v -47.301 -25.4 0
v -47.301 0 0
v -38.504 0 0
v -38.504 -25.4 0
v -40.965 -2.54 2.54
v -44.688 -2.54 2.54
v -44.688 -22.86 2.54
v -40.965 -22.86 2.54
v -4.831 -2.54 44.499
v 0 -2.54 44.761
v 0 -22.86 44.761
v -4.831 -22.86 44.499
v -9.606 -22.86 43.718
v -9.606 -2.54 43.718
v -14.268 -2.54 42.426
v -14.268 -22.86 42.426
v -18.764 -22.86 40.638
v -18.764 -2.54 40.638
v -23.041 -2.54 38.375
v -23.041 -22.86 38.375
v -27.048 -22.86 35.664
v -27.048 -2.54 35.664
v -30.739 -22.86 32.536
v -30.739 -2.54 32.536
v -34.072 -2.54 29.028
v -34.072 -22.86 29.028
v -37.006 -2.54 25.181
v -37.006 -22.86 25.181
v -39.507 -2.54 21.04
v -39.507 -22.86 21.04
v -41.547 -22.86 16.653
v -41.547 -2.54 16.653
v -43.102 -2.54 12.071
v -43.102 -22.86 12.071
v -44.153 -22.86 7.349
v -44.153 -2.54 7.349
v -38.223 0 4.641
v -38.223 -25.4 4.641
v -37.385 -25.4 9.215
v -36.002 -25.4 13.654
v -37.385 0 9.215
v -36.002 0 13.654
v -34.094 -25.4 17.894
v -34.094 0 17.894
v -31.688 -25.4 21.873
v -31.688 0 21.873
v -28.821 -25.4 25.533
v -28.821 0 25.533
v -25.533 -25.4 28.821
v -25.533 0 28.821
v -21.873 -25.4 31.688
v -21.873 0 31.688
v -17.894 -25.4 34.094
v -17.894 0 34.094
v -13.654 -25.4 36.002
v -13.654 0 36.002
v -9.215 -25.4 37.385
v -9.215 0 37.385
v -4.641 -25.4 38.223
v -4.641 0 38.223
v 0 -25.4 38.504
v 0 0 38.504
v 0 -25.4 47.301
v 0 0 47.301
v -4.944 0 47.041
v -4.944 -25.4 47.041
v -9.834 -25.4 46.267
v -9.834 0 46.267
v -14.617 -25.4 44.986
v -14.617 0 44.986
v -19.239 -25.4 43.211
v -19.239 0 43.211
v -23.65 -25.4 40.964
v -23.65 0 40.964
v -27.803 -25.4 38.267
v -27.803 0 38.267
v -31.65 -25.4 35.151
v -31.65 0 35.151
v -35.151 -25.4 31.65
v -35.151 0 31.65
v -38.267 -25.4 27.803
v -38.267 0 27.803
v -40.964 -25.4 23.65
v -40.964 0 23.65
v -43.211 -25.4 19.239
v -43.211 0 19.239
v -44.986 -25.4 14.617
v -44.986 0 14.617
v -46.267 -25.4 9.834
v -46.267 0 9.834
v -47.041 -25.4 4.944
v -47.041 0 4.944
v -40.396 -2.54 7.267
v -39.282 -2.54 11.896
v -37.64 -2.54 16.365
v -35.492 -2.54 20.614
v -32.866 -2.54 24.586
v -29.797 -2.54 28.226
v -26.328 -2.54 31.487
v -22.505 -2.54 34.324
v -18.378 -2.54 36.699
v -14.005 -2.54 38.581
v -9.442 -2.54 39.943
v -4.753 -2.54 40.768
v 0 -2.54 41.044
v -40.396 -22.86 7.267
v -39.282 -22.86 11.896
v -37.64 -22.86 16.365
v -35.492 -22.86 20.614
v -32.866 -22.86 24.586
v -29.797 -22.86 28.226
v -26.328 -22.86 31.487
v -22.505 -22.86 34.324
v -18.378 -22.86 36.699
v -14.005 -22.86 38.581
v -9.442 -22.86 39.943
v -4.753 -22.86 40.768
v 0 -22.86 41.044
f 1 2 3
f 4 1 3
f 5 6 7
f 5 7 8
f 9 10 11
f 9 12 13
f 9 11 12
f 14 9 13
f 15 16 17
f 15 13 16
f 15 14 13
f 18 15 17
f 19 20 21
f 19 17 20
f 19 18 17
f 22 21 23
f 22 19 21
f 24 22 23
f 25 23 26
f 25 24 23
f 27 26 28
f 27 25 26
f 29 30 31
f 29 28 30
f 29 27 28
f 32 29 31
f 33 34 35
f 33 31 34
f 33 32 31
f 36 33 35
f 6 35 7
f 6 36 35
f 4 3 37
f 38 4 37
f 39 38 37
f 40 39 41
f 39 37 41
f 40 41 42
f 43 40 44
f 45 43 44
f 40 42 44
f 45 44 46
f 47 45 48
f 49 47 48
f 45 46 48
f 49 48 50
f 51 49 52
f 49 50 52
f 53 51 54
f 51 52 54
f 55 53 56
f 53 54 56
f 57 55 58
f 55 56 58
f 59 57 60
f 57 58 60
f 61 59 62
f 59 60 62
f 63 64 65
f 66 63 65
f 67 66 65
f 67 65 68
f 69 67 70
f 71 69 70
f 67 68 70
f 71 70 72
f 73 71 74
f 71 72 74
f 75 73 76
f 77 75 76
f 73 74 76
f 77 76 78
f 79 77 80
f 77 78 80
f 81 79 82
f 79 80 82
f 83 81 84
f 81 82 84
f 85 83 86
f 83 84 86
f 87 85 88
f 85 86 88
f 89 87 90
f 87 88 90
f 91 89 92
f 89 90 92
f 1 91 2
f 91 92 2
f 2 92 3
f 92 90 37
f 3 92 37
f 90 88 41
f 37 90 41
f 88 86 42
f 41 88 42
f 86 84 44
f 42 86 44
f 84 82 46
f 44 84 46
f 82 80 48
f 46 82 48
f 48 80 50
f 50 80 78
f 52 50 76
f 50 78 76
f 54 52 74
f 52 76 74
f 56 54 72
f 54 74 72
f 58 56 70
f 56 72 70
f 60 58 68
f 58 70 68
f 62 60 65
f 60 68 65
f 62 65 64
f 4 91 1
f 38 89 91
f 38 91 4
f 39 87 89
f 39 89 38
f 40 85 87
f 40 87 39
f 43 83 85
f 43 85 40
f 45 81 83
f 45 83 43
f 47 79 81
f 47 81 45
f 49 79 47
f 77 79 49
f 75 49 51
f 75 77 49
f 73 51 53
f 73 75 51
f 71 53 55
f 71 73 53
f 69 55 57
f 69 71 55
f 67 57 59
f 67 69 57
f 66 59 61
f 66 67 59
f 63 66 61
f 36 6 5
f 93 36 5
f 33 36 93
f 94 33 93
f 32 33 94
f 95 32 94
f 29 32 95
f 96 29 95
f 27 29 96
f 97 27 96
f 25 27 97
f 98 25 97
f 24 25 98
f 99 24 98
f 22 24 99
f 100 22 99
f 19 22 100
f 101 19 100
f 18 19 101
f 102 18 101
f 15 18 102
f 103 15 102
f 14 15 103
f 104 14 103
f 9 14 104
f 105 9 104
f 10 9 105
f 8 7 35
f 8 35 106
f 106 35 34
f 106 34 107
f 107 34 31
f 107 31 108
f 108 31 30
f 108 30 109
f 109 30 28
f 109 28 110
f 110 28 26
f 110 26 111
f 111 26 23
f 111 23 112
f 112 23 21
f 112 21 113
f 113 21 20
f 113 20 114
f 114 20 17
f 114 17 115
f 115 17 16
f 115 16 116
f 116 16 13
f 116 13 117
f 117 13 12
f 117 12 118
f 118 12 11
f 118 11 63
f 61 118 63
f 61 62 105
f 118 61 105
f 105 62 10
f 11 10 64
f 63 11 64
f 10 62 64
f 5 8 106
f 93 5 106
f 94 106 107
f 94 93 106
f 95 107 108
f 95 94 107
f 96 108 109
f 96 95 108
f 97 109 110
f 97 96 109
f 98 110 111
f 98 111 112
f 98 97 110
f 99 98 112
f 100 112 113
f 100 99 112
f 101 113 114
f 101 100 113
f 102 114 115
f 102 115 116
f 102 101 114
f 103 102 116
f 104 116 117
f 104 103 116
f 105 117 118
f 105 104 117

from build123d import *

# Parameters (mm, degrees)
F1_DEPTH = 25.4
F2_T     = -2.54


with BuildPart() as f1:
    # F0 (on Front) → F1 (new body)
    with BuildSketch(Plane.XZ):
        with BuildLine():
            Line((0, 38.503944), (0, 47.30061))
            ThreePointArc((0, 47.30061), (-33.446582, 33.446582), (-47.30061, 0))
            Line((-47.30061, 0), (-38.503944, 0))
            ThreePointArc((-38.503944, 0), (-27.2264, 27.2264), (0, 38.503944))
        make_face()
    extrude(amount=F1_DEPTH)

    # F2
    f2_openings = [f1.faces().sort_by_distance(p)[0] for p in [
        (0, -12.7, 42.902277),
    ]]
    offset(amount=F2_T, openings=f2_openings)


solid = f1.part
